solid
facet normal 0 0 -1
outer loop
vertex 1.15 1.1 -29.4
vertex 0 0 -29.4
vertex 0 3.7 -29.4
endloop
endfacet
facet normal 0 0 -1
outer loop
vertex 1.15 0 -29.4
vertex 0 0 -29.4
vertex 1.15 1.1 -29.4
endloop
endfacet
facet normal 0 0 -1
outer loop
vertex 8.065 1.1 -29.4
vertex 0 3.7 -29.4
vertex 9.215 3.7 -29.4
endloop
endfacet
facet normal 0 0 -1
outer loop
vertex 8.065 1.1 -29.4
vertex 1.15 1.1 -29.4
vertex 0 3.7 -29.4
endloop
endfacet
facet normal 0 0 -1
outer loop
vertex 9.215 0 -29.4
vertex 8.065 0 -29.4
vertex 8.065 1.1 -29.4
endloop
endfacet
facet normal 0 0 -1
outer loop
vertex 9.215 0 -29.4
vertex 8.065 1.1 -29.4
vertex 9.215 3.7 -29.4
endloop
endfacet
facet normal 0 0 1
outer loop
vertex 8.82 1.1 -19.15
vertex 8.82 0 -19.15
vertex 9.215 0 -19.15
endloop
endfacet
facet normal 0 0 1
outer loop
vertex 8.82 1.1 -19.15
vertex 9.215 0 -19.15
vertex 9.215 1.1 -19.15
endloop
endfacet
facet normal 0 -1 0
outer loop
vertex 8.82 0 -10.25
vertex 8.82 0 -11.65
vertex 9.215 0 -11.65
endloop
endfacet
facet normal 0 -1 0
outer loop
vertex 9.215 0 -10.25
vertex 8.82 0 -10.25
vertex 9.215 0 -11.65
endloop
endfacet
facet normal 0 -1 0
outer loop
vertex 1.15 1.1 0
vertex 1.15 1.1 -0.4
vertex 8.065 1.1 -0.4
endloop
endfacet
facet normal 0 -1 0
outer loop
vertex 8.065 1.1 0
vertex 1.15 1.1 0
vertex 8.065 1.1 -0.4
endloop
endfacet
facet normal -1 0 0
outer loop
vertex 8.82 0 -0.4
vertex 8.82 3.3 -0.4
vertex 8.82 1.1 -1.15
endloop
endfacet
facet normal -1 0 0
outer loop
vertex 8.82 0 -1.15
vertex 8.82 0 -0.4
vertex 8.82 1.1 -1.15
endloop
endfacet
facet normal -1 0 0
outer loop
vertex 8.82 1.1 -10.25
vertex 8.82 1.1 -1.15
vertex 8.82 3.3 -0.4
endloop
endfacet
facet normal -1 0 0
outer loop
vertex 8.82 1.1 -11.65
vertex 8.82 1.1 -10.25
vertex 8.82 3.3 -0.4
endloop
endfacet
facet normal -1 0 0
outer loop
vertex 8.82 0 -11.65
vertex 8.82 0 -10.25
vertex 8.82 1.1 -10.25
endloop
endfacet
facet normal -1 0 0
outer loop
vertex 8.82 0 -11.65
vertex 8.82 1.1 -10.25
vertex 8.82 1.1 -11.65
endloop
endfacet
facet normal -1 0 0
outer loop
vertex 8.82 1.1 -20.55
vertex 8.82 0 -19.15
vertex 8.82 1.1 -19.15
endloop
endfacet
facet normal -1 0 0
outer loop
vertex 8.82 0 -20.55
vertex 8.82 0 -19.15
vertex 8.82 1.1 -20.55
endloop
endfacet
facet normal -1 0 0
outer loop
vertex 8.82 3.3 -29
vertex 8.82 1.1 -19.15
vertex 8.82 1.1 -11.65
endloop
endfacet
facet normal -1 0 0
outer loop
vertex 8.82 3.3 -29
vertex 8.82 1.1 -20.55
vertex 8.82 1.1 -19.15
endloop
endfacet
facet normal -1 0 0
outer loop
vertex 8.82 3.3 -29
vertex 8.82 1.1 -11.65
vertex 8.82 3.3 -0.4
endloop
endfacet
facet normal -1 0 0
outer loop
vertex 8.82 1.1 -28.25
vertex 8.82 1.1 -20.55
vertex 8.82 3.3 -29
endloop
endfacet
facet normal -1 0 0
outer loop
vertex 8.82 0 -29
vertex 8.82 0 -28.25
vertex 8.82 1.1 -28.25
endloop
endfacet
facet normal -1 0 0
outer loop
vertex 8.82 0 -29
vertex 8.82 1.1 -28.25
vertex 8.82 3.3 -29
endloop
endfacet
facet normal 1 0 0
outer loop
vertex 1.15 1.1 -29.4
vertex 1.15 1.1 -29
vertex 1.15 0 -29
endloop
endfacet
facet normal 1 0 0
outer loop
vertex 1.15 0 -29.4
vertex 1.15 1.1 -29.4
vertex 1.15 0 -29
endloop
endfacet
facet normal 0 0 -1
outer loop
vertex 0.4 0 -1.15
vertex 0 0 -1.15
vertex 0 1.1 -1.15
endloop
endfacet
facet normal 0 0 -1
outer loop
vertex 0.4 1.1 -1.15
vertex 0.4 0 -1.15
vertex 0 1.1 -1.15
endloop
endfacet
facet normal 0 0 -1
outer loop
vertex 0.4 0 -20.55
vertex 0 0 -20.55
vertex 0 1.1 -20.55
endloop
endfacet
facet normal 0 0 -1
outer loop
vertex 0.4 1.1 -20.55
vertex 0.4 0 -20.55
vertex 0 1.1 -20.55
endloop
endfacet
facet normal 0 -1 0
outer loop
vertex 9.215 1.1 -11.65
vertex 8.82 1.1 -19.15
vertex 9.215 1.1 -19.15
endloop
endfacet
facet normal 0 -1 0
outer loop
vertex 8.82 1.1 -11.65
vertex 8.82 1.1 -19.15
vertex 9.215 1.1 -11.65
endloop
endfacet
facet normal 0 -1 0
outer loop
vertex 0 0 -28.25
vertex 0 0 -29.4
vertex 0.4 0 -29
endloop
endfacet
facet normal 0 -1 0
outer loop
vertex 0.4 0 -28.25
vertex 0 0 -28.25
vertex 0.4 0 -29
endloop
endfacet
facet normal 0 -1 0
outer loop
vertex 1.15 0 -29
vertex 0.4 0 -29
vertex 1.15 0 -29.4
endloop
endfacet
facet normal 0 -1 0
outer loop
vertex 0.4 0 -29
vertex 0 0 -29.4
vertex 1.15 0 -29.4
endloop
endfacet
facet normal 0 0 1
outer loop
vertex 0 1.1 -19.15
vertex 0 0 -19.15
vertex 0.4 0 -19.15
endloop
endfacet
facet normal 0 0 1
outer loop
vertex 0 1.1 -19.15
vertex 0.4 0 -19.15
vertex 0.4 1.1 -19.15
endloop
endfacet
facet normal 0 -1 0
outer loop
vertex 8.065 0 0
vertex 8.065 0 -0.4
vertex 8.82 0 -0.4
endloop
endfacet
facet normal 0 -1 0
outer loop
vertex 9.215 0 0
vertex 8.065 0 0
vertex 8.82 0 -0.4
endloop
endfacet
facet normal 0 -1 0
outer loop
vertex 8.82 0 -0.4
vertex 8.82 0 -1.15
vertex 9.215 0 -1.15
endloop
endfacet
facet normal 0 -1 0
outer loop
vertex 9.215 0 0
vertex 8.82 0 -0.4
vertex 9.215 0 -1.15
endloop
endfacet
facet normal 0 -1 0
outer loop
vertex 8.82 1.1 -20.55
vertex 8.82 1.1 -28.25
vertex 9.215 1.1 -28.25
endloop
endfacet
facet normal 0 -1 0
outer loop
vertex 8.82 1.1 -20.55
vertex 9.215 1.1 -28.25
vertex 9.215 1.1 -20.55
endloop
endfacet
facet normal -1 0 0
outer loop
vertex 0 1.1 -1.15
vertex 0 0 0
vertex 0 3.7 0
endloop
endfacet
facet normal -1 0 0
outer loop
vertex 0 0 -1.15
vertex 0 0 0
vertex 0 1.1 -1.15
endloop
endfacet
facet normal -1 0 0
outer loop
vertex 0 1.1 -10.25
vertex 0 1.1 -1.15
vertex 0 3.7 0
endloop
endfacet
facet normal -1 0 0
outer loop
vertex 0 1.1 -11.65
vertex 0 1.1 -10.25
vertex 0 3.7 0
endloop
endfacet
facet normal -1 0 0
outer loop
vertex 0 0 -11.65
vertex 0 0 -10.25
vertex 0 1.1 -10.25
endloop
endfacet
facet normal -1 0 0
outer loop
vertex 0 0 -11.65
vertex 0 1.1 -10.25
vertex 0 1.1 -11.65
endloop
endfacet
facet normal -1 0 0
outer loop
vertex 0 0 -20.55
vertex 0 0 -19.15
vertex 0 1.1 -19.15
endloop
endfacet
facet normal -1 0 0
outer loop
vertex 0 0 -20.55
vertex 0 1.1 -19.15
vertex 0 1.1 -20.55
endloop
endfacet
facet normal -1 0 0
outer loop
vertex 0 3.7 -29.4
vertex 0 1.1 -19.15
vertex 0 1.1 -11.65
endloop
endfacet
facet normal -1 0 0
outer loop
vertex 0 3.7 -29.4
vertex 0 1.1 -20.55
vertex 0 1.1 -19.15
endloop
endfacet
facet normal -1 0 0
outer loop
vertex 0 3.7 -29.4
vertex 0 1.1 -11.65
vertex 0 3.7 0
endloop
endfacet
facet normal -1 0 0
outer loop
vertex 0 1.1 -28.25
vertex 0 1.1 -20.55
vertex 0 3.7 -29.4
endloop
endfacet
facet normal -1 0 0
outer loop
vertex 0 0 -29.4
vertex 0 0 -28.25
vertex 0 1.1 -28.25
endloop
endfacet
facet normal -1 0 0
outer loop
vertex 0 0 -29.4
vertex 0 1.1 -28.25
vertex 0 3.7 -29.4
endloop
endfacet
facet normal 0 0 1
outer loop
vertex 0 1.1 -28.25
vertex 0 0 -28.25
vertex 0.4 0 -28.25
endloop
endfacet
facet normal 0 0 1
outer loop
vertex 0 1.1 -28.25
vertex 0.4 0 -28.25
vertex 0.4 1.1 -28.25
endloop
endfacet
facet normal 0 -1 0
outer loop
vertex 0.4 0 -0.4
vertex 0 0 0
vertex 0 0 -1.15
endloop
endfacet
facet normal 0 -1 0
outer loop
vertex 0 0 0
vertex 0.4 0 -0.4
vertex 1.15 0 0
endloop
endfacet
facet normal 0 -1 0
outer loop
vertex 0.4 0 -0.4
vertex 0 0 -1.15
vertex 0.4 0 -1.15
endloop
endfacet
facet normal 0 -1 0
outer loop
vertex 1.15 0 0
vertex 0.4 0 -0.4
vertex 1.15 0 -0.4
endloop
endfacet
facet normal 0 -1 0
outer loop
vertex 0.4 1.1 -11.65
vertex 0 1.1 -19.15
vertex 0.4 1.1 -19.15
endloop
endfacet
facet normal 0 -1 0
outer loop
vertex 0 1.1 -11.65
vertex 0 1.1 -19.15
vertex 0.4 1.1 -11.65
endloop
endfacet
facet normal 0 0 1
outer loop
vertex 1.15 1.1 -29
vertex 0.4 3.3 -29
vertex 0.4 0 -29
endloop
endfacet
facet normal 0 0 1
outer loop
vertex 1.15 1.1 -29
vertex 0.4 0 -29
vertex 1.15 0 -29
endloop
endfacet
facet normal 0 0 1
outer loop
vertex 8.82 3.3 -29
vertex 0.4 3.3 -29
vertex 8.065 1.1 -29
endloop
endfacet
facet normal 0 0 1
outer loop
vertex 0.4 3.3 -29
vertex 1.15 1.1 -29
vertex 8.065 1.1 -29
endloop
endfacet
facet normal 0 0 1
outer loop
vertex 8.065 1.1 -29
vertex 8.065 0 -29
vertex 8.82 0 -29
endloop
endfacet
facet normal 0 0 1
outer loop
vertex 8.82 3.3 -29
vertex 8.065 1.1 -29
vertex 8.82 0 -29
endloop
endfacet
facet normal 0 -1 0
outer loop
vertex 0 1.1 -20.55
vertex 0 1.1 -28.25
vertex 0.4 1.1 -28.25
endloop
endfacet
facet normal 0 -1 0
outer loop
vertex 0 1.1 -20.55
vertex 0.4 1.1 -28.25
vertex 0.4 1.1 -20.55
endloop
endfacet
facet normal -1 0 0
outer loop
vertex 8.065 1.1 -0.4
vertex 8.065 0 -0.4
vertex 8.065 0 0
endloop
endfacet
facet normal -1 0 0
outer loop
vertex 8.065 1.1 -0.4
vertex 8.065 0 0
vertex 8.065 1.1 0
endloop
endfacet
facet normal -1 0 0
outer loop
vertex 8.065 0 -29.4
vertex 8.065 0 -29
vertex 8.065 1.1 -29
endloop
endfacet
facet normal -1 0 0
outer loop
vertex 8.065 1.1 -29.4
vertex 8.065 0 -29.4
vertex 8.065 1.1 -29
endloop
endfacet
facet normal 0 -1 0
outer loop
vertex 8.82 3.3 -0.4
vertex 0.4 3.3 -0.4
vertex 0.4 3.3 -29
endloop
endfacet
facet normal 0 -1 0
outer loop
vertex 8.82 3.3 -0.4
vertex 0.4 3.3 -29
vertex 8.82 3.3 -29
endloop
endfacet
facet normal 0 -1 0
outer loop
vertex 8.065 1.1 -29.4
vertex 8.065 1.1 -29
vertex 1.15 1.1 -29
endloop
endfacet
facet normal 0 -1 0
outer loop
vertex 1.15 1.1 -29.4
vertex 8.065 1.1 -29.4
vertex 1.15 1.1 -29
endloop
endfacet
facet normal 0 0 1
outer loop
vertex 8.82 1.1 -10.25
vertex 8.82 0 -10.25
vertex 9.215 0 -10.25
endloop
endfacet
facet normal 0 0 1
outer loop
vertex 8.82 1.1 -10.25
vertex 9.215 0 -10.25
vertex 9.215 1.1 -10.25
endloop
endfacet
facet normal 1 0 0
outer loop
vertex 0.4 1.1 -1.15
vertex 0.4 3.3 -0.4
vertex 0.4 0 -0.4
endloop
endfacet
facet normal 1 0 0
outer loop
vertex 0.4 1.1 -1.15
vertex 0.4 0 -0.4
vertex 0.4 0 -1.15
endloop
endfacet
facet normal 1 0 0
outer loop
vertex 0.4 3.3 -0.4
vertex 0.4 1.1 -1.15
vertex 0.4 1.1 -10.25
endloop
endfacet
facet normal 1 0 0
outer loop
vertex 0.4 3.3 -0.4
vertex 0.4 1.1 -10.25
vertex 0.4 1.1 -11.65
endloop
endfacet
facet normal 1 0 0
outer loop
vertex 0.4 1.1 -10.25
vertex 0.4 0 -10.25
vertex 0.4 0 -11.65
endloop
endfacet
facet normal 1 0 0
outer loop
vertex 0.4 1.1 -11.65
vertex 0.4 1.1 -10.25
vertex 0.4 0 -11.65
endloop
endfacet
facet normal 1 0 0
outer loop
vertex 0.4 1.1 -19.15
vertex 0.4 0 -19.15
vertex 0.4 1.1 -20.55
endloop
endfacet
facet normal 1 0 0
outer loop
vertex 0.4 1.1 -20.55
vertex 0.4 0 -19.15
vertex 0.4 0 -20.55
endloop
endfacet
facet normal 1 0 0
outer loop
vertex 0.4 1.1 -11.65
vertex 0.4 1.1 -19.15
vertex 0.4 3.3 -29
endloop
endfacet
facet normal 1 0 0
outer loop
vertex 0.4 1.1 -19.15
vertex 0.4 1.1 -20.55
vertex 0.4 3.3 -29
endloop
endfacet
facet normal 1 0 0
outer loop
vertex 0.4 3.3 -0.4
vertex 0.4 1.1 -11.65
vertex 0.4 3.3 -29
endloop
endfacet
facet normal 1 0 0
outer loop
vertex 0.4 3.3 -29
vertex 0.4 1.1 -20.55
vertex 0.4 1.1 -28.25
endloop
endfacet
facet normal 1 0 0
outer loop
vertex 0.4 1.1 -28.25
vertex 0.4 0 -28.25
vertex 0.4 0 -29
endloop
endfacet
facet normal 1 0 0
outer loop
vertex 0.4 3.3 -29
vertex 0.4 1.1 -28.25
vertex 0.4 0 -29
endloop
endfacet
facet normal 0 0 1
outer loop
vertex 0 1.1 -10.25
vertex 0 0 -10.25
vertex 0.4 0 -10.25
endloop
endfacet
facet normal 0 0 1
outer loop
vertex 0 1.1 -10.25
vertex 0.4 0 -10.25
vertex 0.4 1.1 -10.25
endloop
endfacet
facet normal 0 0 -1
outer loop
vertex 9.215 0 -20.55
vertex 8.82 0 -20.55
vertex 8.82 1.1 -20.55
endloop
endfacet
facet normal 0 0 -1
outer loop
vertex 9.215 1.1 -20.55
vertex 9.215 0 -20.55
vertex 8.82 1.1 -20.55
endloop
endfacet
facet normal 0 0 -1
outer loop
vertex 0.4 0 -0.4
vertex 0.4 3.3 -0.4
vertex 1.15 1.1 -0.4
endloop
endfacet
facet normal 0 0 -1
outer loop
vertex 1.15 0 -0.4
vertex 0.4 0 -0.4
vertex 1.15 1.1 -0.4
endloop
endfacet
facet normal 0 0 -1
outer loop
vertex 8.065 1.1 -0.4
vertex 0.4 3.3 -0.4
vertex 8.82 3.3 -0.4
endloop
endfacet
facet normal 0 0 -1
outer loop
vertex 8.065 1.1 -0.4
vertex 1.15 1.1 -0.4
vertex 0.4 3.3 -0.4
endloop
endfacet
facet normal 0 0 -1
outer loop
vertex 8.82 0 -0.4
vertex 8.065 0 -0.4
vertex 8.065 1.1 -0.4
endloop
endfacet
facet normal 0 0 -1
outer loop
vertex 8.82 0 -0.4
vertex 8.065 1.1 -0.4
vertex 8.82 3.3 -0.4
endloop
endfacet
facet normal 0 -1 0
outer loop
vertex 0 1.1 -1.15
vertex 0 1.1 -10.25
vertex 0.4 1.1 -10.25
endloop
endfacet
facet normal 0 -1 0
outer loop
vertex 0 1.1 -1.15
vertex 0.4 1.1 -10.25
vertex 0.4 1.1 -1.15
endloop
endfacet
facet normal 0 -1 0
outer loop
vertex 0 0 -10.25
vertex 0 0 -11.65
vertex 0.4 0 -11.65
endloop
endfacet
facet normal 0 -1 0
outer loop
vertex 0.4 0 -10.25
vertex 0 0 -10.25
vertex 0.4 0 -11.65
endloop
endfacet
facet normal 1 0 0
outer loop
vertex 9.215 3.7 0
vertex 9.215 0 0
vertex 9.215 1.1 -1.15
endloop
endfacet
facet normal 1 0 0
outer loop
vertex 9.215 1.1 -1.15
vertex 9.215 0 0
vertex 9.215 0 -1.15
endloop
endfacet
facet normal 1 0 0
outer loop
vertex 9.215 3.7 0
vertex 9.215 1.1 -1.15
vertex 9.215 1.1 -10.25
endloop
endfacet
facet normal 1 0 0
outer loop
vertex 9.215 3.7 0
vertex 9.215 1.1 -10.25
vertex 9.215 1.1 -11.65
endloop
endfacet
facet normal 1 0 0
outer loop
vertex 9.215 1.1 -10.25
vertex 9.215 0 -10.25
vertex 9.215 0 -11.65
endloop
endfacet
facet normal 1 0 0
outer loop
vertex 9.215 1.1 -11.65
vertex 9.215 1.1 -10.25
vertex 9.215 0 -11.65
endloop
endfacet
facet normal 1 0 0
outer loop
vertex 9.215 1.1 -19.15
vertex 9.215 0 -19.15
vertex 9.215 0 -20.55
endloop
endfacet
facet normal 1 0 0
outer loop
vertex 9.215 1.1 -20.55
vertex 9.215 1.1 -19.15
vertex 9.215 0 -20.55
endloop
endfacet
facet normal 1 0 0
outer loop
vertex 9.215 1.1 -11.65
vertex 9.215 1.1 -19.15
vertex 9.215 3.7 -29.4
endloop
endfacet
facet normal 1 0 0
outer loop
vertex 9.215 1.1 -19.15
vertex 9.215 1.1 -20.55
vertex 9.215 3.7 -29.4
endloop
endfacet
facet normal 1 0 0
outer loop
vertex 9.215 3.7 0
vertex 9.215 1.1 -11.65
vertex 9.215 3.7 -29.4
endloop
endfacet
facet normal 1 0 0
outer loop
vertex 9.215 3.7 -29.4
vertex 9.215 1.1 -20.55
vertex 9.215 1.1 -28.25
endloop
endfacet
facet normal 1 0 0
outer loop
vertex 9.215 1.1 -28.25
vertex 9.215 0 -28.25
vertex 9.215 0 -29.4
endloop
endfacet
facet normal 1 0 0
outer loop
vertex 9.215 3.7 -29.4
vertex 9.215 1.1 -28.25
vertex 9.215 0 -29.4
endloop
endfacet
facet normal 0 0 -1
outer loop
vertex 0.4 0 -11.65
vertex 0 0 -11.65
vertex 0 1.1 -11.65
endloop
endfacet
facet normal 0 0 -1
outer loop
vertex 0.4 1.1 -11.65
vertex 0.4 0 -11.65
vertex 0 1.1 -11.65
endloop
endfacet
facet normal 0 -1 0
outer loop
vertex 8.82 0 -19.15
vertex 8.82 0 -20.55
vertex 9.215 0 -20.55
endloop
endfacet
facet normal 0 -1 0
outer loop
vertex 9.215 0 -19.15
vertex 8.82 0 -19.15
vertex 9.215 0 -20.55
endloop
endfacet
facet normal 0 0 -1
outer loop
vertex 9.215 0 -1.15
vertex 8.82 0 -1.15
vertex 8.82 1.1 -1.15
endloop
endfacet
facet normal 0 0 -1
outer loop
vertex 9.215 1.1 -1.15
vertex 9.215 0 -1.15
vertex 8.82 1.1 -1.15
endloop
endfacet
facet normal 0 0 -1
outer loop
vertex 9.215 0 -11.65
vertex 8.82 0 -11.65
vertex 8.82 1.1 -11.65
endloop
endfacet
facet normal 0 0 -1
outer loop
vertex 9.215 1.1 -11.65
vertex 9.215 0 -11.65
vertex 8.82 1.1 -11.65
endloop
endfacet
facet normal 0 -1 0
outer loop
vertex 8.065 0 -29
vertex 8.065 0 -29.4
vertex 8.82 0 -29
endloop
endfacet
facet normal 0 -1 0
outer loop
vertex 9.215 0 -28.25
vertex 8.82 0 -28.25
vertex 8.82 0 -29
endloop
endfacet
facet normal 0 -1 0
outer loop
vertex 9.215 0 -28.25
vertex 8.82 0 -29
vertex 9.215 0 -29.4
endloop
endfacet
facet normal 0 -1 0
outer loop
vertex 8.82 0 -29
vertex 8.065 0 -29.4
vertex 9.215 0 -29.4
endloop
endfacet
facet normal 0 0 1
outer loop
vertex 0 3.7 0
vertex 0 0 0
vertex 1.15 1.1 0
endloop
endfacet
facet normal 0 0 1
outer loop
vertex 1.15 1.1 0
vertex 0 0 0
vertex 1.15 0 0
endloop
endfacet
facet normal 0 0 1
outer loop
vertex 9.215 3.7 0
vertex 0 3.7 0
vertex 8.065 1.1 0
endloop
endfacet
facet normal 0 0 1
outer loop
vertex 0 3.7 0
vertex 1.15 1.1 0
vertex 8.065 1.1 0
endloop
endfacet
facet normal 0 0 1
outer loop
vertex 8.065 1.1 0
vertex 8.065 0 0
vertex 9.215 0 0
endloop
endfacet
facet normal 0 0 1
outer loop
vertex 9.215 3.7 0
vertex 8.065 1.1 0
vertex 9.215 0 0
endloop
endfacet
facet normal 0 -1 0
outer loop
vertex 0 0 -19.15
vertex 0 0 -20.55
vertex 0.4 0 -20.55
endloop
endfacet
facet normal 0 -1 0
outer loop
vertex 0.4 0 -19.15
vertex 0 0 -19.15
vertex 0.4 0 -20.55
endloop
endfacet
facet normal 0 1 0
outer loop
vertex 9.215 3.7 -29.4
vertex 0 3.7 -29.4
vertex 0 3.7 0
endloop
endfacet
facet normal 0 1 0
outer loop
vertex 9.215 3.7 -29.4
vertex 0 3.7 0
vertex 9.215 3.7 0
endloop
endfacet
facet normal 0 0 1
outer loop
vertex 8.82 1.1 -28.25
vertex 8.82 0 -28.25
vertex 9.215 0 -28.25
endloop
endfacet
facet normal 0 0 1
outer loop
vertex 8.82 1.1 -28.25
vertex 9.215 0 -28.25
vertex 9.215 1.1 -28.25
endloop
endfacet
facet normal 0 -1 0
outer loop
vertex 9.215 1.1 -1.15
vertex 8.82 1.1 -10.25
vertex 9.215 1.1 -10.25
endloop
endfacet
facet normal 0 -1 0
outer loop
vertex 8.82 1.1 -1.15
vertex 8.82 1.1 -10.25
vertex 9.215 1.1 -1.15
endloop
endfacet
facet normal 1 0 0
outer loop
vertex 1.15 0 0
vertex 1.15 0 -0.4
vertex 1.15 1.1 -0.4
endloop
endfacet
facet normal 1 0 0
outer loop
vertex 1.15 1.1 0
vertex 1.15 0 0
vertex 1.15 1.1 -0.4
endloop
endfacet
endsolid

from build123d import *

# Parameters (mm, degrees)
SKETCH_2_W                = 9.215
SKETCH_2_H                = 29.4
EXTRUDE_1_DEPTH           = 3.7
SKETCH_2_5_W              = 8.42
SKETCH_2_5_H              = 28.6
CUT_EXTRUDE_2_DEPTH       = 3.3
CUT_EXTRUDE_7_DEPTH       = 32.031697102
CUT_EXTRUDE_7_DEPTH_BACK  = 0.4
SKETCH_3_W                = 6.915
SKETCH_3_H                = 1.1
CUT_EXTRUDE_11_DEPTH      = 32.031697102
CUT_EXTRUDE_11_DEPTH_BACK = 0.4
SKETCH_14_W               = 7.7
SKETCH_14_H               = 1.1
SKETCH_14_W_2             = 7.5
SKETCH_14_W_3             = 9.1
CUT_EXTRUDE_12_DEPTH      = 10


with BuildPart() as part:
    # 草图2 → 凸台-拉伸1 (new body)
    with BuildSketch(Plane(origin=(0, 0, 0), x_dir=(1, 0, 0), z_dir=(0, 1, 0))):
        with Locations((4.6075, 14.7)):
            Rectangle(SKETCH_2_W, SKETCH_2_H)
    extrude(amount=EXTRUDE_1_DEPTH)

    # 草图2<5> → 切除-拉伸2 (cut)
    with BuildSketch(Plane(origin=(0, 0, 0), x_dir=(1, 0, 0), z_dir=(0, 1, 0))):
        with Locations((4.61, 14.7)):
            Rectangle(SKETCH_2_5_W, SKETCH_2_5_H)
    extrude(amount=CUT_EXTRUDE_2_DEPTH, mode=Mode.SUBTRACT)

    # 草图3 → 切除-拉伸7 (cut, two sides: drawn at the far end of the back side and taken through both)
    with BuildSketch(Plane.XY.offset(-CUT_EXTRUDE_7_DEPTH_BACK)):
        with Locations((4.6075, 0.55)):
            Rectangle(SKETCH_3_W, SKETCH_3_H)
    extrude(amount=CUT_EXTRUDE_7_DEPTH + CUT_EXTRUDE_7_DEPTH_BACK, mode=Mode.SUBTRACT)

    # 草图8 → 切除-拉伸11 (cut, two sides: drawn at the far end of the back side and taken through both)
    with BuildSketch(Plane(origin=(0, 0, -29.4), x_dir=(-1, 0, 0), z_dir=(0, 0, -1)).offset(-CUT_EXTRUDE_11_DEPTH_BACK)):
        Polygon((-39.075133434, 0), (-9.215, 0), (-8.065, 0), (-8.065, 1.1), (-1.15, 1.1), (-1.15, 0), (0, 0), (29.860133434, 0), (29.860133434, -59.720266867), (-39.075133434, -59.720266867), align=None)
    extrude(amount=CUT_EXTRUDE_11_DEPTH + CUT_EXTRUDE_11_DEPTH_BACK, mode=Mode.SUBTRACT)

    # 草图14 → 切除-拉伸12 (cut)
    with BuildSketch(Plane.ZY):
        with Locations((-24.4, 0.55)):
            Rectangle(SKETCH_14_W, SKETCH_14_H)
        with Locations((-15.4, 0.55)):
            Rectangle(SKETCH_14_W_2, SKETCH_14_H)
        with Locations((-5.7, 0.55)):
            Rectangle(SKETCH_14_W_3, SKETCH_14_H)
    extrude(amount=-CUT_EXTRUDE_12_DEPTH, mode=Mode.SUBTRACT)


solid = part.part
